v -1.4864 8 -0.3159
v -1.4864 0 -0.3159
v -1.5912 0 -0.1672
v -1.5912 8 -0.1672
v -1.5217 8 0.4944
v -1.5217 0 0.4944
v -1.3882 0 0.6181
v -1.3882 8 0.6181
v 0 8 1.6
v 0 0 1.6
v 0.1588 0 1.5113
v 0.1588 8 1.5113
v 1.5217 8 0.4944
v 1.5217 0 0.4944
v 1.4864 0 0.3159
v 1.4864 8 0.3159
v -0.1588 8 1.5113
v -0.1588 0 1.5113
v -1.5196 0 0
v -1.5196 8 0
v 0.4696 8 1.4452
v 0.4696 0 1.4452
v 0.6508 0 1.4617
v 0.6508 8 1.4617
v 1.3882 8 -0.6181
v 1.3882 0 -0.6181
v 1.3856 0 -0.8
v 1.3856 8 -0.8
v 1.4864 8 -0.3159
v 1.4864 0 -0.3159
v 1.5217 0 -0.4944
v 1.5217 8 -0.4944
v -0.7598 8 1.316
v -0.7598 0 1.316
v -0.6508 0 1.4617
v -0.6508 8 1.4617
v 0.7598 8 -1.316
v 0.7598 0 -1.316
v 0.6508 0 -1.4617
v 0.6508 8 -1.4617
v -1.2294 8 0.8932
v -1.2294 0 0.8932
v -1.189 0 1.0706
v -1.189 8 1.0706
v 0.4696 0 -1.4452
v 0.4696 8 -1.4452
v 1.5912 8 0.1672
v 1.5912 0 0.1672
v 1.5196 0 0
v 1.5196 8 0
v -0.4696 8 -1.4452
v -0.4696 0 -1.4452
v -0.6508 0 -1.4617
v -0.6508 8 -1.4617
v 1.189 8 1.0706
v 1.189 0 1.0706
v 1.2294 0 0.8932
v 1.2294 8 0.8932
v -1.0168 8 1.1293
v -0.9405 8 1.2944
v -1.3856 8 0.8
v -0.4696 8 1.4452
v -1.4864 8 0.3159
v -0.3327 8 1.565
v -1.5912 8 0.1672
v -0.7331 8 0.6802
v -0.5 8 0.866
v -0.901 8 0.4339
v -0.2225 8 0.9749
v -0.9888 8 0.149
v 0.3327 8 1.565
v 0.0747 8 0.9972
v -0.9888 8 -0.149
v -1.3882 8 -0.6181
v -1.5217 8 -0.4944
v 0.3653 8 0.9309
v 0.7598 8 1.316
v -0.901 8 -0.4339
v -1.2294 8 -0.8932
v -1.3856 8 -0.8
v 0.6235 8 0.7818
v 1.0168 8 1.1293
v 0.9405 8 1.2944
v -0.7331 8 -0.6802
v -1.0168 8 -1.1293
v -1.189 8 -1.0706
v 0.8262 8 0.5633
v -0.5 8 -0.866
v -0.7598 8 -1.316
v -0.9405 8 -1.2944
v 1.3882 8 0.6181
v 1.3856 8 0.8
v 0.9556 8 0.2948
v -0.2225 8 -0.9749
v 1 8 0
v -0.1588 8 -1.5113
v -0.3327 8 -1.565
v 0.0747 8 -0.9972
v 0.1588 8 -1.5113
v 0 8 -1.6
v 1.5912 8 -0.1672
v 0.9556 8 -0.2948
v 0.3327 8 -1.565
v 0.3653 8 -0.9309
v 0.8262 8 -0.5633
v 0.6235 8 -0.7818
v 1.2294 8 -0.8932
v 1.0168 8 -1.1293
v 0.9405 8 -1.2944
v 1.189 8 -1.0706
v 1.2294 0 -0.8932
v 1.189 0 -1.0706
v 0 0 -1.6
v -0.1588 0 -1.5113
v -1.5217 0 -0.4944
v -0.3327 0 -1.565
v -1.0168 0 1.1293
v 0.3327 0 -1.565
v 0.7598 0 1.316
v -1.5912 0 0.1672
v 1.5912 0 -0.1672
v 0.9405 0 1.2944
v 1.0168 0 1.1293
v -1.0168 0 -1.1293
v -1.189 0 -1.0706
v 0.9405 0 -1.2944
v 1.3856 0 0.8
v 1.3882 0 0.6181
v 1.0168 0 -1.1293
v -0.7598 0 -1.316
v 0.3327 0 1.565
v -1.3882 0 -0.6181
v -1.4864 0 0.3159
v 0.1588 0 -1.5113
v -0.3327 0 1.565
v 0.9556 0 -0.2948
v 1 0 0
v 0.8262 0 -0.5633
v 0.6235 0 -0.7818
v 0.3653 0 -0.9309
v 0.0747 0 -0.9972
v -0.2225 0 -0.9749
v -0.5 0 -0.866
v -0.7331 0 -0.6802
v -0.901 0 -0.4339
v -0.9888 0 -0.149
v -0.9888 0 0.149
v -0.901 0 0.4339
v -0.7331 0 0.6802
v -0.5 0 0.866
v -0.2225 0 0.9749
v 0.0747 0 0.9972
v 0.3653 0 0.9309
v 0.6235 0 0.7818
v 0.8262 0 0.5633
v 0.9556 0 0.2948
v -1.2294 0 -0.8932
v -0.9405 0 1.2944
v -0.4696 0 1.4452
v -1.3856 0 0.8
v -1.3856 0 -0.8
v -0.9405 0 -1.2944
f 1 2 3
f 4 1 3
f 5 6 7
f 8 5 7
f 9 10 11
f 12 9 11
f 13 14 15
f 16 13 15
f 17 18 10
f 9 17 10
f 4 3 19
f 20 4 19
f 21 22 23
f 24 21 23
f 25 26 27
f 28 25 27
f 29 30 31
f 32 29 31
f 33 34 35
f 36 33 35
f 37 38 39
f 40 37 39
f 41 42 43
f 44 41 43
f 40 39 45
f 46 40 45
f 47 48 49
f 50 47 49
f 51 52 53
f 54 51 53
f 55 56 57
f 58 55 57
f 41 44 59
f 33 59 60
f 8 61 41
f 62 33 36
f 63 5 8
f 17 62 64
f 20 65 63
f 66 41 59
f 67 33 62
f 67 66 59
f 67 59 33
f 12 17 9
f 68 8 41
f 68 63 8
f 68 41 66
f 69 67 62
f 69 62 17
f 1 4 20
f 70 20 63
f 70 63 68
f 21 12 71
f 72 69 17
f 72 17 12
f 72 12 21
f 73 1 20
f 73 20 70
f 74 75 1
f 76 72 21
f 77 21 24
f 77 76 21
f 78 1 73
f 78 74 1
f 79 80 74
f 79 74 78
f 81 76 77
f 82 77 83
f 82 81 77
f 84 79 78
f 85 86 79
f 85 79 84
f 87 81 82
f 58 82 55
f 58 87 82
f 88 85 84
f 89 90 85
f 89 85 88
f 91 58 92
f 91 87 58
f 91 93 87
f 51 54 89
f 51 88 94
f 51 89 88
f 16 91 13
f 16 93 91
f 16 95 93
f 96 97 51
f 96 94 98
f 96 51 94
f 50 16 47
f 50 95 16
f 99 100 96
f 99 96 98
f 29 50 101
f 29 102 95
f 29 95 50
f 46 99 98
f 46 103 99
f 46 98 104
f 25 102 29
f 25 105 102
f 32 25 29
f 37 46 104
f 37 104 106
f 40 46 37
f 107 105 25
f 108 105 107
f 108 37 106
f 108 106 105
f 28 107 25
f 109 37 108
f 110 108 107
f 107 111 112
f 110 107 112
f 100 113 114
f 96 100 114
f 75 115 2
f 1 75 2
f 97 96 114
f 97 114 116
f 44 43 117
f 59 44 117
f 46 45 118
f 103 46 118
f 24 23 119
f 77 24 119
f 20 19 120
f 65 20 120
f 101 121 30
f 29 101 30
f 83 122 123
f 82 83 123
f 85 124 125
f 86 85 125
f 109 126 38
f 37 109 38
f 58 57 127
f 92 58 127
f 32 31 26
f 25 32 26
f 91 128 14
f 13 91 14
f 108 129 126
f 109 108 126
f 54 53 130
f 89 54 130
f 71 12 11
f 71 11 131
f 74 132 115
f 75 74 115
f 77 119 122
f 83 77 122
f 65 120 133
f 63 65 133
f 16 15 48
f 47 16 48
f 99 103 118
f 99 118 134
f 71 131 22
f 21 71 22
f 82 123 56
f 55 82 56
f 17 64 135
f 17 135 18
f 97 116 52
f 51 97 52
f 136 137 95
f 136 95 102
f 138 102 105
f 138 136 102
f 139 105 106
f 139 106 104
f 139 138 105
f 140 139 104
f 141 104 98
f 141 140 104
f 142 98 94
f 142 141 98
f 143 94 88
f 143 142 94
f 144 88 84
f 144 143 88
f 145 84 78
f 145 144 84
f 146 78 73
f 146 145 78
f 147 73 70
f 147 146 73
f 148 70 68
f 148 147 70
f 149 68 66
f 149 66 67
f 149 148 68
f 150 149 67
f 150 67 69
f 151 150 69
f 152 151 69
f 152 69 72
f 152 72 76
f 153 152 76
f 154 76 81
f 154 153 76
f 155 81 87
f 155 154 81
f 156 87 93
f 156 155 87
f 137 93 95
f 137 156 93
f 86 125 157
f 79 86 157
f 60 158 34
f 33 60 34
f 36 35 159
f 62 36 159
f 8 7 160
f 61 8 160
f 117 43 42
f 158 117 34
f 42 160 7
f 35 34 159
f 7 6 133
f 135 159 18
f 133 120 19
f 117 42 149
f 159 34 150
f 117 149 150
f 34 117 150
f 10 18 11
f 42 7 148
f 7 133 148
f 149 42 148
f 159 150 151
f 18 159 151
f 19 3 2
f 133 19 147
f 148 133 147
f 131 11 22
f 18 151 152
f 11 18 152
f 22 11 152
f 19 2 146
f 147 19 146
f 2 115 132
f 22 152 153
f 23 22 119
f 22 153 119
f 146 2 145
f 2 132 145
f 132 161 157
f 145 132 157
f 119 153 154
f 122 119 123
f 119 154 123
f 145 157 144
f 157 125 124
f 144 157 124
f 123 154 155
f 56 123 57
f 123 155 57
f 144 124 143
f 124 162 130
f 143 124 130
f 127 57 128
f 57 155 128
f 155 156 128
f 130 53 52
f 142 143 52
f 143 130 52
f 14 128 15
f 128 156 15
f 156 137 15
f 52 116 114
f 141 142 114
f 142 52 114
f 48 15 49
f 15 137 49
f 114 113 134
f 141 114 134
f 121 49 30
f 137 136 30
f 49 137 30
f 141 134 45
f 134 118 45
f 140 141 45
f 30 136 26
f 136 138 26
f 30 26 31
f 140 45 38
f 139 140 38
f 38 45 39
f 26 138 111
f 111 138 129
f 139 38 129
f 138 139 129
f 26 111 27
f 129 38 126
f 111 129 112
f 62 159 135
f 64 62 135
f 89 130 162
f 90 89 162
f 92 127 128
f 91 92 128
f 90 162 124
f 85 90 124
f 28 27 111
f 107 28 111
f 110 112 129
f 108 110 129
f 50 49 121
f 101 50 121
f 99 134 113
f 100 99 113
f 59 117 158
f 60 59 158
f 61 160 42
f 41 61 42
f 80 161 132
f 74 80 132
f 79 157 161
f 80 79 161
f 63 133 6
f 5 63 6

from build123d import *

# Parameters (mm, degrees)
SKETCH_1_R      = 1
EXTRUDE_1_DEPTH = 8


with BuildPart() as part:
    # 草图1 → 凸台-拉伸1 (new body)
    with BuildSketch(Plane(origin=(0, 0, 0), x_dir=(1, 0, 0), z_dir=(0, 1, 0))):
        Polygon((0, 1.6), (-0.158843146, 1.511291584), (-0.332658705, 1.565036161), (-0.469587231, 1.44524089), (-0.650778629, 1.461672732), (-0.7598081, 1.316026234), (-0.940456404, 1.294427191), (-1.01682171, 1.129294916), (-1.189031721, 1.07060897), (-1.229395331, 0.893207992), (-1.385640646, 0.8), (-1.388238477, 0.618083592), (-1.521690426, 0.494427191), (-1.486408941, 0.315945974), (-1.591235033, 0.167245541), (-1.519616201, 0), (-1.591235033, -0.167245541), (-1.486408941, -0.315945974), (-1.521690426, -0.494427191), (-1.388238477, -0.618083592), (-1.385640646, -0.8), (-1.229395331, -0.893207992), (-1.189031721, -1.07060897), (-1.01682171, -1.129294916), (-0.940456404, -1.294427191), (-0.7598081, -1.316026234), (-0.650778629, -1.461672732), (-0.469587231, -1.44524089), (-0.332658705, -1.565036161), (-0.158843146, -1.511291584), (0, -1.6), (0.158843146, -1.511291584), (0.332658705, -1.565036161), (0.469587231, -1.44524089), (0.650778629, -1.461672732), (0.7598081, -1.316026234), (0.940456404, -1.294427191), (1.01682171, -1.129294916), (1.189031721, -1.07060897), (1.229395331, -0.893207992), (1.385640646, -0.8), (1.388238477, -0.618083592), (1.521690426, -0.494427191), (1.486408941, -0.315945974), (1.591235033, -0.167245541), (1.519616201, 0), (1.591235033, 0.167245541), (1.486408941, 0.315945974), (1.521690426, 0.494427191), (1.388238477, 0.618083592), (1.385640646, 0.8), (1.229395331, 0.893207992), (1.189031721, 1.07060897), (1.01682171, 1.129294916), (0.940456404, 1.294427191), (0.7598081, 1.316026234), (0.650778629, 1.461672732), (0.469587231, 1.44524089), (0.332658705, 1.565036161), (0.158843146, 1.511291584), align=None)
        Circle(SKETCH_1_R, mode=Mode.SUBTRACT)
    extrude(amount=EXTRUDE_1_DEPTH)


solid = part.part
